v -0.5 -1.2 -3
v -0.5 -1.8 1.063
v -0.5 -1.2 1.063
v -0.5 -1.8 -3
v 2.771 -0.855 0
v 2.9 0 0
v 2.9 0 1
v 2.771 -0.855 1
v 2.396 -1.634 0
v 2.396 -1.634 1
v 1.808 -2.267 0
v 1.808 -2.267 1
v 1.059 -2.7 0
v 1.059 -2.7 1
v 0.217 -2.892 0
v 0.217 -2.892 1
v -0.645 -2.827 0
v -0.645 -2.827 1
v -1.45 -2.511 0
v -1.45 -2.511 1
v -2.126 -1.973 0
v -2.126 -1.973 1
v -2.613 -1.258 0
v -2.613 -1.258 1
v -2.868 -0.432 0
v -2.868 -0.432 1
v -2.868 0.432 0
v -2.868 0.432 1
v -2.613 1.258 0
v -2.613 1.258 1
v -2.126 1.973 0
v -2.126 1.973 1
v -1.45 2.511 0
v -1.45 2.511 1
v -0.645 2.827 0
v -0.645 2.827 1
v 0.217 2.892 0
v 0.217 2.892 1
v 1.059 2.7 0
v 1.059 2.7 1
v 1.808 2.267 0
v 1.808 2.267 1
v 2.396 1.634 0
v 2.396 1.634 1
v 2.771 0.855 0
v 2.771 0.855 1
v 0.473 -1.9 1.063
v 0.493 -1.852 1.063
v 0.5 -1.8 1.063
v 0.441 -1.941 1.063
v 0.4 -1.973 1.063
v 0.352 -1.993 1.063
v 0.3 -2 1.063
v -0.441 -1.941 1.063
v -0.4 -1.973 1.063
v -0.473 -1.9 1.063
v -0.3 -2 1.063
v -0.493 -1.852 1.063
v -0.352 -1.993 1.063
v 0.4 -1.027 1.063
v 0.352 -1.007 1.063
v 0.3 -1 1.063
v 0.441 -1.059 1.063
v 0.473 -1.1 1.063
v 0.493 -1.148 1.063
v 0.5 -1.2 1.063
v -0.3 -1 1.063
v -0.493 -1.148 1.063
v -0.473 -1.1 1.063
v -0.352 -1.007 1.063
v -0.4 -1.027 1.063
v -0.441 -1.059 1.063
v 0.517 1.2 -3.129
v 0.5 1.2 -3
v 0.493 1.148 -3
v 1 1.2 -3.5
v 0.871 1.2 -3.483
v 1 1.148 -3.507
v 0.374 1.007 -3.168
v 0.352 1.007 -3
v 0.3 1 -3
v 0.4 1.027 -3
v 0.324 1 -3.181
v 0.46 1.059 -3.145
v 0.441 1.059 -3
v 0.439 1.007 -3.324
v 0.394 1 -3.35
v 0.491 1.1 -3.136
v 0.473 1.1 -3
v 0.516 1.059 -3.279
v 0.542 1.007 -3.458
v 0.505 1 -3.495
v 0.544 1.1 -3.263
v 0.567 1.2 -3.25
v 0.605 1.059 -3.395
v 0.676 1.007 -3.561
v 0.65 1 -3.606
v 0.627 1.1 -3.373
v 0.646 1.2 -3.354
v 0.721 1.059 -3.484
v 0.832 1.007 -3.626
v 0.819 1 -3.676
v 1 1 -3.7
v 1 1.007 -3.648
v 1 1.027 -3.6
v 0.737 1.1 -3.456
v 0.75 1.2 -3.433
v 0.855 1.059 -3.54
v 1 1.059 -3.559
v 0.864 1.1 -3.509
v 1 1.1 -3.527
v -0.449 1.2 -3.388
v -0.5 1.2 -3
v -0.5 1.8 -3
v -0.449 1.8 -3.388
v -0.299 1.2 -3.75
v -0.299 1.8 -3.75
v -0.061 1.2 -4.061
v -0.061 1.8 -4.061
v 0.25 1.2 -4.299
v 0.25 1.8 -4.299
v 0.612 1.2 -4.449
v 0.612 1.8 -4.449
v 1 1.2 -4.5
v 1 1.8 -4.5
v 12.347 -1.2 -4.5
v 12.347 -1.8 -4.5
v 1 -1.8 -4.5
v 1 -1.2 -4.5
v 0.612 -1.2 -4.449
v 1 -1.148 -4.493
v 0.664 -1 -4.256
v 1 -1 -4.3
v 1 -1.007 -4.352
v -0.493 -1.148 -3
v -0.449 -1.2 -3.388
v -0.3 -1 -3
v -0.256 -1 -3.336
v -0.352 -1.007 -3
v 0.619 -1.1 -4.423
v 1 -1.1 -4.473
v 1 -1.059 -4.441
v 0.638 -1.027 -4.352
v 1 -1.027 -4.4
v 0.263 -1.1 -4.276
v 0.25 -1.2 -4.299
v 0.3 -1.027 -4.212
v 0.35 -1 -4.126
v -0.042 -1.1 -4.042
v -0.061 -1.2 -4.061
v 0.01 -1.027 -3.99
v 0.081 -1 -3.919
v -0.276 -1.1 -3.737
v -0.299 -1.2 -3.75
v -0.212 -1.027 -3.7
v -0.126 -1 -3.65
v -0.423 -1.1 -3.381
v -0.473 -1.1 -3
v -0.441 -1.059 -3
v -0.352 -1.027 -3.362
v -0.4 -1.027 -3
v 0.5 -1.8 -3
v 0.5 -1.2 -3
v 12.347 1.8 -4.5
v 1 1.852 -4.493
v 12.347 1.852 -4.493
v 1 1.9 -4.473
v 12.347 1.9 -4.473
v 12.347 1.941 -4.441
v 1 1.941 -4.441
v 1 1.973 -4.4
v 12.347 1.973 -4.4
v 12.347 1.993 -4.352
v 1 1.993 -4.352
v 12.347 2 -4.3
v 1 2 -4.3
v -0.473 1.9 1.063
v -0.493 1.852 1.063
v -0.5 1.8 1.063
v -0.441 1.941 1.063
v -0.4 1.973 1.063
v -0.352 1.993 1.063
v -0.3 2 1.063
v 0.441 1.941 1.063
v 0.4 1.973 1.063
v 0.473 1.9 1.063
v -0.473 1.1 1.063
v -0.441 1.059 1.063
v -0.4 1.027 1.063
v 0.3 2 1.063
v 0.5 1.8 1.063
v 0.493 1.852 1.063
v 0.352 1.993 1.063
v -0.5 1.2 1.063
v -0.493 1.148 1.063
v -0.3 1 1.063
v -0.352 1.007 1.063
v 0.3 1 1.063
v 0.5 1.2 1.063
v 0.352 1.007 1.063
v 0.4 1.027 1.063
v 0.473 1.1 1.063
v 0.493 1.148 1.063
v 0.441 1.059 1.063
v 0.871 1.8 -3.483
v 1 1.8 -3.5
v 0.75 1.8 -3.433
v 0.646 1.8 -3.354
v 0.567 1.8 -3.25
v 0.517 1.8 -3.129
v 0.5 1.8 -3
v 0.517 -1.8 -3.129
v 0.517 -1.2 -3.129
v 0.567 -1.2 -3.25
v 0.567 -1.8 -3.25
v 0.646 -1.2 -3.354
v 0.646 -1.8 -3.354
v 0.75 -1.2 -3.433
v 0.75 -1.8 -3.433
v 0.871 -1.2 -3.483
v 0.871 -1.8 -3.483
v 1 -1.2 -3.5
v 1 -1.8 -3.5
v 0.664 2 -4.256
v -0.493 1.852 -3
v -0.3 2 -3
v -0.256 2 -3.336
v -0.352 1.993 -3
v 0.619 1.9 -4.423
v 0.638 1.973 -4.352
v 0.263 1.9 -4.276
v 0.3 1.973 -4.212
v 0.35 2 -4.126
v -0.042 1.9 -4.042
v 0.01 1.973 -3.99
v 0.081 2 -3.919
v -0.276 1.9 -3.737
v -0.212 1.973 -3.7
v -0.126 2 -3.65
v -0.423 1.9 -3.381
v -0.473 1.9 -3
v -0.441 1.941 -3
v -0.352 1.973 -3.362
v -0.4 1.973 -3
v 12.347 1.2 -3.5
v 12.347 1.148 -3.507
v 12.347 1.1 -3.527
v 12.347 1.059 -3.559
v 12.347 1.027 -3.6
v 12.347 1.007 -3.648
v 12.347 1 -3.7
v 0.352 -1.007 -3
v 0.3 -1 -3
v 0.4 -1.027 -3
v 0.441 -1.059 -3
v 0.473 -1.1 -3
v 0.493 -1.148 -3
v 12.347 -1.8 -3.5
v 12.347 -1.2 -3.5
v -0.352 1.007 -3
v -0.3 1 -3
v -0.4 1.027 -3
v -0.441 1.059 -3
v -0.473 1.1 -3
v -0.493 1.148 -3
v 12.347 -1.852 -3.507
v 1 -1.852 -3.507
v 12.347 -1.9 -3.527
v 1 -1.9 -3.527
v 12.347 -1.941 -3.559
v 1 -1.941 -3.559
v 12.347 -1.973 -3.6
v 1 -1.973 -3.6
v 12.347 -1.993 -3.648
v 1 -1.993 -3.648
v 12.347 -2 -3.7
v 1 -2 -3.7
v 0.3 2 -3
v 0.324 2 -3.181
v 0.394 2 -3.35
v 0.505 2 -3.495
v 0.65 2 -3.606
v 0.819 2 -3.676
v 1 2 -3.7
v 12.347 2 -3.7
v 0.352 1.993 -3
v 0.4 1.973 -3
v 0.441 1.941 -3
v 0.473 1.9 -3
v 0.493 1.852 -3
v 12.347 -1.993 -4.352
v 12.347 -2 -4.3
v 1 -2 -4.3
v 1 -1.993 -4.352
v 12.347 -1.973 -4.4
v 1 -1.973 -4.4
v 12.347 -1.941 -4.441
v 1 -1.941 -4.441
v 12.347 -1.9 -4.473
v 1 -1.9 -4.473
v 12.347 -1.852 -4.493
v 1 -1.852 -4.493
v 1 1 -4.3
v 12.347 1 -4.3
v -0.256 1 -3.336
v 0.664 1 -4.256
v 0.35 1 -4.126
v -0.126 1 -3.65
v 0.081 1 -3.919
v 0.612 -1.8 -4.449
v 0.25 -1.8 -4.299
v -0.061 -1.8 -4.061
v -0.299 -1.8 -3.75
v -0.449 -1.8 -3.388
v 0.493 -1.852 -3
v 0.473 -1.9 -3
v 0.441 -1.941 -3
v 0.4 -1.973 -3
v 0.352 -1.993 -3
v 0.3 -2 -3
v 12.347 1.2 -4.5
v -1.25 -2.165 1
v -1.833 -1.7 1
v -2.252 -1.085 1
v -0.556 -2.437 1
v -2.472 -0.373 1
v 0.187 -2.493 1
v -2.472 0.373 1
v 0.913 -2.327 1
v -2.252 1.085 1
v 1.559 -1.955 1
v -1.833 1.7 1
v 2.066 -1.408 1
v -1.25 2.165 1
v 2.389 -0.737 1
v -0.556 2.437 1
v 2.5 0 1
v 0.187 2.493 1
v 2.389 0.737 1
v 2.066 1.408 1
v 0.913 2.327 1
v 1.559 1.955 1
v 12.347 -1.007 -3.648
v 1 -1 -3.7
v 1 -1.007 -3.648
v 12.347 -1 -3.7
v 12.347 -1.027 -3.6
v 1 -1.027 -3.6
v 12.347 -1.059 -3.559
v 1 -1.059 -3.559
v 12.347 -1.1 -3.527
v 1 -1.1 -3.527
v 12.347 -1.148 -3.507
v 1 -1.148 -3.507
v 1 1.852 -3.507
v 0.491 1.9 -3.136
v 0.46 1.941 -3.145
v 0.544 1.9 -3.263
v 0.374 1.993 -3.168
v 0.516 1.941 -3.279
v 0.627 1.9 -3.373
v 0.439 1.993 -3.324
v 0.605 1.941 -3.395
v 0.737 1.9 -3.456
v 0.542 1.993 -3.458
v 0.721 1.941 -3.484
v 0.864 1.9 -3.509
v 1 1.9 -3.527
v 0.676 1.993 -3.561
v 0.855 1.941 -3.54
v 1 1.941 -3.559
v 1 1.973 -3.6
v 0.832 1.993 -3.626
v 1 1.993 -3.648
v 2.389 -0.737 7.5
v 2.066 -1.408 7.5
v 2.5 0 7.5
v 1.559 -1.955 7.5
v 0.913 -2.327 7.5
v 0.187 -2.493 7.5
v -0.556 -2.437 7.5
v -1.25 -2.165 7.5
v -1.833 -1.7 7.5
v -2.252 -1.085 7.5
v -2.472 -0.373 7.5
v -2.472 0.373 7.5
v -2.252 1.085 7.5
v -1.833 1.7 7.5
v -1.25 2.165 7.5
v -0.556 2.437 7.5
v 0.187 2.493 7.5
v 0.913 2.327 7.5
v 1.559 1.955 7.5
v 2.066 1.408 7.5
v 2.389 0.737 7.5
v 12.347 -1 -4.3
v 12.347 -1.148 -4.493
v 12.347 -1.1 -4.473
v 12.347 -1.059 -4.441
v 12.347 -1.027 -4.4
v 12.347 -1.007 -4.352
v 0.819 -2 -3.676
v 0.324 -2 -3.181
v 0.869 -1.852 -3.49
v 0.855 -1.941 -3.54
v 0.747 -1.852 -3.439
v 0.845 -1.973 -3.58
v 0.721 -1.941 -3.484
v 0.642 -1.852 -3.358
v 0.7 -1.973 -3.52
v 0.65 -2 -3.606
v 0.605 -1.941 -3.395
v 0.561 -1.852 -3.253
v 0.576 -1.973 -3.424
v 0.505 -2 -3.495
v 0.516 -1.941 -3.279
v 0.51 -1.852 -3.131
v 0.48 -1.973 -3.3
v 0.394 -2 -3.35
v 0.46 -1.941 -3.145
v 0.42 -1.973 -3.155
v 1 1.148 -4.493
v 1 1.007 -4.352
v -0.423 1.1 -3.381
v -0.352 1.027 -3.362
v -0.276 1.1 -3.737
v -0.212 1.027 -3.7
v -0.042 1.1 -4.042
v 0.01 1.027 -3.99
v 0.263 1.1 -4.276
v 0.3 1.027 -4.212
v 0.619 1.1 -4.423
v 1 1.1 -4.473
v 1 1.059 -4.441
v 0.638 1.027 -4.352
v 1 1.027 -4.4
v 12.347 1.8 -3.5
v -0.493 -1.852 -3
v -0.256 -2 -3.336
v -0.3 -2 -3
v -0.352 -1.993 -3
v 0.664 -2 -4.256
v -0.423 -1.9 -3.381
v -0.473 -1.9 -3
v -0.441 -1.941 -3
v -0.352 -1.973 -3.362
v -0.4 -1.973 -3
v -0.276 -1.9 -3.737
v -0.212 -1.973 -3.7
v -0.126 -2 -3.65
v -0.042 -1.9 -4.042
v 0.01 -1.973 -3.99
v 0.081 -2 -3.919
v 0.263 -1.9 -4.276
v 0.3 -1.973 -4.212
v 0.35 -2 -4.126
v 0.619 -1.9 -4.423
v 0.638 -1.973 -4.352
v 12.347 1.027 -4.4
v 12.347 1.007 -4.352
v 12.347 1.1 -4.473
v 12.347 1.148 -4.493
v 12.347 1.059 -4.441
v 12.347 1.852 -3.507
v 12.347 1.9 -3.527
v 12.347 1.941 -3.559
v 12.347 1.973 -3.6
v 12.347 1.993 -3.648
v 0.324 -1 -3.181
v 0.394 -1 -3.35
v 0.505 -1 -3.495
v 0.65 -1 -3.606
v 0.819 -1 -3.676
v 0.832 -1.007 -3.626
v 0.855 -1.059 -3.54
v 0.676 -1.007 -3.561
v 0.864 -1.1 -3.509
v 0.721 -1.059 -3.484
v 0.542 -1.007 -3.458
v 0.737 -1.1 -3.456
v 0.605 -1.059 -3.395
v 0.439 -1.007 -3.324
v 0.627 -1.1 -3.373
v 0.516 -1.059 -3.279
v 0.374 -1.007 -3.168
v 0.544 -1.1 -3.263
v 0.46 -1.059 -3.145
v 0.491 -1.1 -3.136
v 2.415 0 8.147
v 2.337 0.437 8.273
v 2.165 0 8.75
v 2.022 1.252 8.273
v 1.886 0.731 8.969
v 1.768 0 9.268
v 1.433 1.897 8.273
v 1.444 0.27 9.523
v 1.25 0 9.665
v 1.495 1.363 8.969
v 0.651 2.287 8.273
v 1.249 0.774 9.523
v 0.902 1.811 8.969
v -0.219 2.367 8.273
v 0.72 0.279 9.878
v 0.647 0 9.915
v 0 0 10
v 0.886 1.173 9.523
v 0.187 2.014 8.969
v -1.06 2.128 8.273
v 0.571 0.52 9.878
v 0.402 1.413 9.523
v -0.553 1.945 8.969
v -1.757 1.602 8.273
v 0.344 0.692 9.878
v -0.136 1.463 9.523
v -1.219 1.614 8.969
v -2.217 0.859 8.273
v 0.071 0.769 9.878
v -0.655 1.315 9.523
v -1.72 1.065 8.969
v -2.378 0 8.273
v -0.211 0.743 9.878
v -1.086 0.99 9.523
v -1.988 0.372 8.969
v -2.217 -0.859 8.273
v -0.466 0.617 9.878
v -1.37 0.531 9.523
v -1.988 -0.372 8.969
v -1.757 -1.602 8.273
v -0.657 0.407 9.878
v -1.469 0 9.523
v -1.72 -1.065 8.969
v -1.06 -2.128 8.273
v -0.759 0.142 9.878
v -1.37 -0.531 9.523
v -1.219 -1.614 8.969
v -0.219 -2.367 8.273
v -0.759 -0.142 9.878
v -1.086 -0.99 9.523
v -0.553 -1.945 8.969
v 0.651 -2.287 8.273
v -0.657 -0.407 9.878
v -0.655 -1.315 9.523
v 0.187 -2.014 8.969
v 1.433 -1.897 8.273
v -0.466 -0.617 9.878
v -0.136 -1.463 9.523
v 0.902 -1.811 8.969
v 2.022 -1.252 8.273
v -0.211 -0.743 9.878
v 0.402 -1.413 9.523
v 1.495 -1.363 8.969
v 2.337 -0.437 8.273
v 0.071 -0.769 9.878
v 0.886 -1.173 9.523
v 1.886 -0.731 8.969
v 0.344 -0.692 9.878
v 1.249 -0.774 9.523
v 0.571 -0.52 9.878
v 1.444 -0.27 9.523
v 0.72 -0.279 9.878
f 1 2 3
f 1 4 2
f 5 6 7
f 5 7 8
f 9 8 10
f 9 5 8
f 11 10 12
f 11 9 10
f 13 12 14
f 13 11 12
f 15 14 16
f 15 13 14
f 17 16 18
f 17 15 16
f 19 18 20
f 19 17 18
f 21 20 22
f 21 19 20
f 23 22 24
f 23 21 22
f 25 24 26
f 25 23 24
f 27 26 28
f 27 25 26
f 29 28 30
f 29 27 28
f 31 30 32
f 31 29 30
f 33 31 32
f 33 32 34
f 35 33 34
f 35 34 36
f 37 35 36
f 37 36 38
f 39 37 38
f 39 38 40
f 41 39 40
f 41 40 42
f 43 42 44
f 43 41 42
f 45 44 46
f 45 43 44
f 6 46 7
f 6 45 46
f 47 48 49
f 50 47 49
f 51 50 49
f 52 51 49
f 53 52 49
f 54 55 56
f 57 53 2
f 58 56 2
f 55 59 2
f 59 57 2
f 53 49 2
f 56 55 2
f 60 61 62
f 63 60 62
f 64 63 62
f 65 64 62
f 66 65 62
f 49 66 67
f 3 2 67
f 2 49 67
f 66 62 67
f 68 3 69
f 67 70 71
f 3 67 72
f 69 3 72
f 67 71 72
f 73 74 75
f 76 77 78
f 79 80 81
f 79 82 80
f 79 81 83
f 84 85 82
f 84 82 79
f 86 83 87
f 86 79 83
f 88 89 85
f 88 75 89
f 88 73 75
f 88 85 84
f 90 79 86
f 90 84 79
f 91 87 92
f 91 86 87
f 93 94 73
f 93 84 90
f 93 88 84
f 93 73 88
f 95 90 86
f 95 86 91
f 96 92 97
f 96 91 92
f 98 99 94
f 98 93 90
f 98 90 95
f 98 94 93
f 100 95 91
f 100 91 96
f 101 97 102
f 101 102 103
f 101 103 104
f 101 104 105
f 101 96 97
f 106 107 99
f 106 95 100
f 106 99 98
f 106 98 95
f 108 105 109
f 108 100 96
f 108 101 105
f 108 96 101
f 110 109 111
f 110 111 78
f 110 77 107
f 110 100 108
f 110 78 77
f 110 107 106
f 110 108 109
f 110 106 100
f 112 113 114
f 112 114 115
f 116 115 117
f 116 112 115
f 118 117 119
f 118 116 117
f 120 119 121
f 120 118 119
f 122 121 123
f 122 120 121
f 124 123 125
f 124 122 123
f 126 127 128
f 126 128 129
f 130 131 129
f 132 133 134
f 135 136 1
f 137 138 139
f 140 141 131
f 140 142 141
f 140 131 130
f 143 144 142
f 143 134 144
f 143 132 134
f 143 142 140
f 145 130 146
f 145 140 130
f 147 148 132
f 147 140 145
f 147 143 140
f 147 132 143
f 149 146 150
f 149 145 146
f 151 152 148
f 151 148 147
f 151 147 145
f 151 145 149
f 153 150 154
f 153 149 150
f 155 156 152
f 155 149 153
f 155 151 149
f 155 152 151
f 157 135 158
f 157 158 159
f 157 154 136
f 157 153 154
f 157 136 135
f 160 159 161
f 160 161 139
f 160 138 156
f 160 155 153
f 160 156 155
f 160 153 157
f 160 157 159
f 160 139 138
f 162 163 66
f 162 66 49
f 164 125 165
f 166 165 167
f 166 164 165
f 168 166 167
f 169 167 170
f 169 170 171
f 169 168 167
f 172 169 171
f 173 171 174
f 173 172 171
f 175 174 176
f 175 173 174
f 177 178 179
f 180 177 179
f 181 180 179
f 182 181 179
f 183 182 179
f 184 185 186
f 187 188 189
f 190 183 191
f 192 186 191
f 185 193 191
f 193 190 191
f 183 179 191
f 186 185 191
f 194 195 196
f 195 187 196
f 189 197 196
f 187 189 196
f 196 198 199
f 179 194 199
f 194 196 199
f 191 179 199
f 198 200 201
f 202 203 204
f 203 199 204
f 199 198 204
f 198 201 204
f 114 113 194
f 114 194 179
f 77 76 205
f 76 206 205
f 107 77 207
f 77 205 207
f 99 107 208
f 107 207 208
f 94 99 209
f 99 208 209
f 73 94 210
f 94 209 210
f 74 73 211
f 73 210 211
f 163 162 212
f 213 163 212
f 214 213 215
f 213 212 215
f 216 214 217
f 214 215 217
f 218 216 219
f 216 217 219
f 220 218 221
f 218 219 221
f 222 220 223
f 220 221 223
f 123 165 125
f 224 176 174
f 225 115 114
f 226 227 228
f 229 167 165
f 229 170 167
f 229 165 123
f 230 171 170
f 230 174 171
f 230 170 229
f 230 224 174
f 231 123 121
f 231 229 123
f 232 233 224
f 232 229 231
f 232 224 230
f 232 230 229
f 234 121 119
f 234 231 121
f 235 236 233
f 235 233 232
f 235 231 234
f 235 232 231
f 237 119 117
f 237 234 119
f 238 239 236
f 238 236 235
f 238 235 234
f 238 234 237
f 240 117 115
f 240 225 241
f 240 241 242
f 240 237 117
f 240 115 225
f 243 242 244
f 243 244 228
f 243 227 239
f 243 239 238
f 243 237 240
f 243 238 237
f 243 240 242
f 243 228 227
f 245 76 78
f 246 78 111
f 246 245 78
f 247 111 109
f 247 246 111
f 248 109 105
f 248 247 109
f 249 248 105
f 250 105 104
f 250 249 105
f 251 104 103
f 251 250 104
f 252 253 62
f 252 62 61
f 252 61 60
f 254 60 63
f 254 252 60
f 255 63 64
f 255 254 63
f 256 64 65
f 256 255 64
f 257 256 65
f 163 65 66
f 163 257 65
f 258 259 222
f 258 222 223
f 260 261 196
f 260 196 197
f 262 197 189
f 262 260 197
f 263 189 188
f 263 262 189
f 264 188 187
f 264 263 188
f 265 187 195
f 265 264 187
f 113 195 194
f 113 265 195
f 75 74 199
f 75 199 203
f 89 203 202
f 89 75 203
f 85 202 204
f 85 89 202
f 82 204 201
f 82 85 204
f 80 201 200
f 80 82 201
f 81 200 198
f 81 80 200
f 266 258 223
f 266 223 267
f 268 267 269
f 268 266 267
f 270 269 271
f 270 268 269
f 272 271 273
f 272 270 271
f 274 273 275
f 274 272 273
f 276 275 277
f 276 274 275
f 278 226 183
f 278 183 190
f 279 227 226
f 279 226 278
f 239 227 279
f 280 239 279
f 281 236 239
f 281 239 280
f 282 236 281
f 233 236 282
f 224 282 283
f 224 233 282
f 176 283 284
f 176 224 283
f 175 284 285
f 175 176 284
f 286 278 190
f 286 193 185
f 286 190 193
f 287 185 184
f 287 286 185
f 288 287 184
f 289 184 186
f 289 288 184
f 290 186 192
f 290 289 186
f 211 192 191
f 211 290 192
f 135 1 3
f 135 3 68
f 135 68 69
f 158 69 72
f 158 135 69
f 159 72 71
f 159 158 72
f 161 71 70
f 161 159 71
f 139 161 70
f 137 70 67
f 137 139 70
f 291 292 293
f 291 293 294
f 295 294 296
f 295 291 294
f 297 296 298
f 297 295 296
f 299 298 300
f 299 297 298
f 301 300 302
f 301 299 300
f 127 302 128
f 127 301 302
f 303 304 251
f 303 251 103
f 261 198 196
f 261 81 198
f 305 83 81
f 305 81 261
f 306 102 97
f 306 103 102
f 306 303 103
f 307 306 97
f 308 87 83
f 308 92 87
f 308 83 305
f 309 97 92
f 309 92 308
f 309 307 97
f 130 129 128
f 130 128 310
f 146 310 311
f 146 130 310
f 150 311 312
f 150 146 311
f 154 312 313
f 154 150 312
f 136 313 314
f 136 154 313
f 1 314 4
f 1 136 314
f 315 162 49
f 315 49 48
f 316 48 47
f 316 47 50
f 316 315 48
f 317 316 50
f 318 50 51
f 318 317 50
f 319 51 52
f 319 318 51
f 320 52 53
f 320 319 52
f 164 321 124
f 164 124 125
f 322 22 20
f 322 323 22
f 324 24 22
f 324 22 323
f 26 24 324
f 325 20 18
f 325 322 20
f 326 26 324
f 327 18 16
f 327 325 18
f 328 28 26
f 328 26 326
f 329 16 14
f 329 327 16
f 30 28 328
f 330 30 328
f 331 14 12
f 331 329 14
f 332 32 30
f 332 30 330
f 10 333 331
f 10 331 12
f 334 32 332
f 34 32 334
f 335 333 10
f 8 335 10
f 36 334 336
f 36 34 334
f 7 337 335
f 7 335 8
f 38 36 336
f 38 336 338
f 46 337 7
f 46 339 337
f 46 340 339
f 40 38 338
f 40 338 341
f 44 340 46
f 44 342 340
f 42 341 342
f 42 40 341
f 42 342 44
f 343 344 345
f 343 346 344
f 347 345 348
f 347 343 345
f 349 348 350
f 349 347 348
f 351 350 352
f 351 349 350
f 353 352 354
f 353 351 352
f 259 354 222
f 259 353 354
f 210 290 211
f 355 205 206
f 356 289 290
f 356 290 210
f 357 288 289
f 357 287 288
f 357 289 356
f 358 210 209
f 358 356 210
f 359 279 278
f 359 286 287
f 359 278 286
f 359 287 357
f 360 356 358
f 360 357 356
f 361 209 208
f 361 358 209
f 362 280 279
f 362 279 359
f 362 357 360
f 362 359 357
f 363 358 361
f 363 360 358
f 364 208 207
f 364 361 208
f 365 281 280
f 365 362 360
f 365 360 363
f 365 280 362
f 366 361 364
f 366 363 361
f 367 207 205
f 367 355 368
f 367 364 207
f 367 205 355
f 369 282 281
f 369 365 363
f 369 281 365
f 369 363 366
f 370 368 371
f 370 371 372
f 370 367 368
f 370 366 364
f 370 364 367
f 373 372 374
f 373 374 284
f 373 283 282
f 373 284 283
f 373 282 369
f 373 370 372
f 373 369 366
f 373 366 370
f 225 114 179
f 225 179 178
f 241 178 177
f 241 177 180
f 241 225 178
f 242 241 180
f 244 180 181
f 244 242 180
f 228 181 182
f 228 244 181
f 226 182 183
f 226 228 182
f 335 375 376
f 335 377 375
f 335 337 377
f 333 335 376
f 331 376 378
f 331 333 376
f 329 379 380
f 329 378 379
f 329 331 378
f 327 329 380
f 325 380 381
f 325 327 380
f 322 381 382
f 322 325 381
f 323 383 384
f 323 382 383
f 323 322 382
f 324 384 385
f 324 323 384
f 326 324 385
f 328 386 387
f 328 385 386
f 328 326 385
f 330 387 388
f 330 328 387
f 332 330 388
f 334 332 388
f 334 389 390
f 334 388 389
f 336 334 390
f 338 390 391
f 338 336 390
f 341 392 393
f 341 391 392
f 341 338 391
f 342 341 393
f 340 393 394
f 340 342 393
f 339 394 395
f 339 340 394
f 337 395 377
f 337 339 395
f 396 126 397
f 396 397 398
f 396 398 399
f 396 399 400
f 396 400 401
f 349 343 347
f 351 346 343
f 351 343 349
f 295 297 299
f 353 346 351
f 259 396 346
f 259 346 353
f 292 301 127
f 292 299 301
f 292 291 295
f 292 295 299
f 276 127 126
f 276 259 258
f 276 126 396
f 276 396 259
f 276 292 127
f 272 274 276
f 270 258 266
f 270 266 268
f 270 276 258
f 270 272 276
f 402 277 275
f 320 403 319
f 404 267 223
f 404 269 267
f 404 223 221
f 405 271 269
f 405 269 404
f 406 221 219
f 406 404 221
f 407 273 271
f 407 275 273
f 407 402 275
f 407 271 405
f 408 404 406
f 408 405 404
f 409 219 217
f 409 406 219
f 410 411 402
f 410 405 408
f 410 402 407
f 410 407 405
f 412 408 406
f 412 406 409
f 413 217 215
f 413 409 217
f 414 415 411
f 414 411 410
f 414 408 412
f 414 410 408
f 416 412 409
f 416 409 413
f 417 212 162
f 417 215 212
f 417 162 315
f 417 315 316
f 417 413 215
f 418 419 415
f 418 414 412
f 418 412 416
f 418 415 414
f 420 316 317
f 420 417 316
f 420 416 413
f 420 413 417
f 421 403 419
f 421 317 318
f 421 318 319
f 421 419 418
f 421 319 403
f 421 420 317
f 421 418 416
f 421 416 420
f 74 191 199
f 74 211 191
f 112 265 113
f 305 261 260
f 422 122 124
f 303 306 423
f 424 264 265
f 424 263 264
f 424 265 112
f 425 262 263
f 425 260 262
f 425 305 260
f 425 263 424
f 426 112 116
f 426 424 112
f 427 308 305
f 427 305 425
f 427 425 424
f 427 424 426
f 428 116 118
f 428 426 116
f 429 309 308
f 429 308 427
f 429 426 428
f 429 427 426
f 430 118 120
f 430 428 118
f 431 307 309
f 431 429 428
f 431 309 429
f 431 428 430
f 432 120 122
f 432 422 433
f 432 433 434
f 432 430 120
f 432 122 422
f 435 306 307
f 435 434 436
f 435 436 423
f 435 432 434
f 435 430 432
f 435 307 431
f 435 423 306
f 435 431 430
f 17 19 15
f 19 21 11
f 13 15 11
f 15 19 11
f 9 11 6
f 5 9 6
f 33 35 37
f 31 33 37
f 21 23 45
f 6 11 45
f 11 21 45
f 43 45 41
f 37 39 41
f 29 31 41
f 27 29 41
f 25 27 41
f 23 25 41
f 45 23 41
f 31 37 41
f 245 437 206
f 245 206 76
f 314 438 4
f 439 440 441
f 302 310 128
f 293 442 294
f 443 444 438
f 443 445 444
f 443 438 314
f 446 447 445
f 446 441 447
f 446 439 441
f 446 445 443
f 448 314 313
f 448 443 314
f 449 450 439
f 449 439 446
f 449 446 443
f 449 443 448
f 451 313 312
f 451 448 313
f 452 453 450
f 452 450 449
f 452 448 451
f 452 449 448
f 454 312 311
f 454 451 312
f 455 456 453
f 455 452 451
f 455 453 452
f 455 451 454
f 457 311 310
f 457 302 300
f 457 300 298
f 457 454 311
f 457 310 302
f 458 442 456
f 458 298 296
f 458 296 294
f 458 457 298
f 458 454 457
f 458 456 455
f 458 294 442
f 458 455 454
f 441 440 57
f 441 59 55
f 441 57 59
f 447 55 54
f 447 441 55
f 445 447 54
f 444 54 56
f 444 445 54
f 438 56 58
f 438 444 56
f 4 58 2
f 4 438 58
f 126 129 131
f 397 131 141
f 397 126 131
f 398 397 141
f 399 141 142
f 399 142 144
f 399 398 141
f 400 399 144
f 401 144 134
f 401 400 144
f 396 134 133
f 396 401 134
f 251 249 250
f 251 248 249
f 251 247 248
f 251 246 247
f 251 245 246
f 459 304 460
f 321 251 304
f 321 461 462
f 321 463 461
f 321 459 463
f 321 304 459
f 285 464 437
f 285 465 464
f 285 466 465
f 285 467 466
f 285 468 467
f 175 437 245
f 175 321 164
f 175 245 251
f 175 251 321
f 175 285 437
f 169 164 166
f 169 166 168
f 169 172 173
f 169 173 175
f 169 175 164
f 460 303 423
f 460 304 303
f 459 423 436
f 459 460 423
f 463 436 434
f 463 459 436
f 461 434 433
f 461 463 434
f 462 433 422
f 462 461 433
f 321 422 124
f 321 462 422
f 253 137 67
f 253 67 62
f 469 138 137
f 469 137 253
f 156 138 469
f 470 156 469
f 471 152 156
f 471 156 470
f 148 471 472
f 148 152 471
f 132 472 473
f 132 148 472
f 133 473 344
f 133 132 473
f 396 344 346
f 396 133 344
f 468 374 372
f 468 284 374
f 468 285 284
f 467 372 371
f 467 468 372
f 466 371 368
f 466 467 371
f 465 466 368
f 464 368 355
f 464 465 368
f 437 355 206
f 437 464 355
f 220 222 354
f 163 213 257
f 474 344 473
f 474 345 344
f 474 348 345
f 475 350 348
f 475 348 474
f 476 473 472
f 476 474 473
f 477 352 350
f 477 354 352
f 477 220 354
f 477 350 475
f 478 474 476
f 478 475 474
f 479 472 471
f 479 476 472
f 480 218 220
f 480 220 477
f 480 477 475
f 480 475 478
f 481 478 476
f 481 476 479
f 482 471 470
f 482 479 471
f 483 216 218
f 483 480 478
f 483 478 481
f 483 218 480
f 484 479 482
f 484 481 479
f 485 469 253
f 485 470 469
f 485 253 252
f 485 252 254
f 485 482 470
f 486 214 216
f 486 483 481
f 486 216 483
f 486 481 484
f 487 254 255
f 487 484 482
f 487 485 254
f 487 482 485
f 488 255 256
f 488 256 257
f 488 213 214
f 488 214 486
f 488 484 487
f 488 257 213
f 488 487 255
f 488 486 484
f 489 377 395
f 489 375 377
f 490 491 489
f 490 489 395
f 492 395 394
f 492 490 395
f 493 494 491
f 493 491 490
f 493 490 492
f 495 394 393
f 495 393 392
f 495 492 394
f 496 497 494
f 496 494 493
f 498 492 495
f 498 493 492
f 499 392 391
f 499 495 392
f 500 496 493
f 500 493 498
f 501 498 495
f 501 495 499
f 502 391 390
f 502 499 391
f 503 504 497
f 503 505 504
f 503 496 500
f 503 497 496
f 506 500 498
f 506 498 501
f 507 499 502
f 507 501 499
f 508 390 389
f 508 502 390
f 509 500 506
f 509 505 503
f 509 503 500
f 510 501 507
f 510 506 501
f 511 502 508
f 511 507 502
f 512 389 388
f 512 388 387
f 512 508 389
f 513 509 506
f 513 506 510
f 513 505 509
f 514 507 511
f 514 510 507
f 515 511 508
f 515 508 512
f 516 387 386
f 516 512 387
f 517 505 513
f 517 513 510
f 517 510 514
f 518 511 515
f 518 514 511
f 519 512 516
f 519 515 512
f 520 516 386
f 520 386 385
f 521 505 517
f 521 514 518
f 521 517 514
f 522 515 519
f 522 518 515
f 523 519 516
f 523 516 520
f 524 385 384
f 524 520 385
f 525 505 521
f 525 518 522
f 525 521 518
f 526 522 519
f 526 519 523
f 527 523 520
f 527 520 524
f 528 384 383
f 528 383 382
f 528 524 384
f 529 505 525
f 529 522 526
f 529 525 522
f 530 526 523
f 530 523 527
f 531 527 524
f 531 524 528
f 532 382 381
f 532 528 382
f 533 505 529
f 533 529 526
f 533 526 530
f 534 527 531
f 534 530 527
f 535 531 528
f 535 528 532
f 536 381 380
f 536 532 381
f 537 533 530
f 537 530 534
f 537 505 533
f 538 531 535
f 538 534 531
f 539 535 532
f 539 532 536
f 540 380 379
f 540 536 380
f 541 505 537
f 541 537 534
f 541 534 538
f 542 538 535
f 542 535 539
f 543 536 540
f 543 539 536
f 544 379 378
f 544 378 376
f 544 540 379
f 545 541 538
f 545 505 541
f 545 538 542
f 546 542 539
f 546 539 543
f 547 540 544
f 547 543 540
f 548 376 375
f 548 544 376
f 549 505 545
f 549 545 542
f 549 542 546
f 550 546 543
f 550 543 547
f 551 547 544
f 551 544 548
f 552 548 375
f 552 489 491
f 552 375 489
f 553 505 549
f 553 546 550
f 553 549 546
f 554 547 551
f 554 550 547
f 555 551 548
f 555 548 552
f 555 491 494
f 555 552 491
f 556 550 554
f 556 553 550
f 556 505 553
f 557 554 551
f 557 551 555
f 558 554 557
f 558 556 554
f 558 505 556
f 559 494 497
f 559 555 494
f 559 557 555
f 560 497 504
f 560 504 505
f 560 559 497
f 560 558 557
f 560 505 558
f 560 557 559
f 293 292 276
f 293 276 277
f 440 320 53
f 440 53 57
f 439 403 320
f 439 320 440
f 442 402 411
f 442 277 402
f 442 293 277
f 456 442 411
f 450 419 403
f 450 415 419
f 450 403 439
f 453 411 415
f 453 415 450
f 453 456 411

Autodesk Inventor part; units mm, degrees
ref_plane "YZ Plane" through (0, 0, 0) normal (1, 0, 0) x (0, 1, 0)
sketch "Skizze1" plane through (0, 0, 0) normal (0, 0, 1) x (1, 0, 0)
  circle A0 centre (0, 0) radius 2.9
  dimension "d0" = 5.8
extrude "Extrusion1" add sketch "Skizze1" along normal blind 1
sketch "Skizze2" plane through (0, 0, 1) normal (0, 0, 1) x (1, 0, 0)
  circle A0 centre (0, 0) radius 2.5
  dimension "d3" = 5
extrude "Extrusion2" add sketch "Skizze2" along normal blind 9
fillet "Rundung1" radius 2.5 1 edges at (-2.5, 0, 10)
sketch "Skizze3" plane through (0, 0, 0) normal (0, 0, -1) x (-1, 0, 0)
  point P0 (0, 0)
ref_plane "Arbeitsebene1" through (0, -1.5, 0) normal (0, 1, 0) x (-1, 0, 0)
sketch "Skizze4" plane through (0, -1.5, 0) normal (0, 1, 0) x (-1, 0, 0)
  line L0 (0, 1.0632) -> (0, -3)
  line L1 (-1, -4) -> (-12.3472, -4)
  arc A0 (-1, -4) -> (0, -3) centre (-1, -3) ccw
  line L2 (2.9, 0) -> (-2.9, 0) projected
  point P0 (0, 0)
  dimension "d8" = 1
  dimension "d9" = 4
ref_plane "Arbeitsebene2" through (12.3472, -1.5, -4) normal (1, 0, 0) x (0, 1, 0)
sketch "Skizze5" plane through (12.3472, -1.5, -4) normal (1, 0, 0) x (0, 1, 0)
  line L0 (0.5, -0.5) -> (-0.5, -0.5)
  line L1 (-0.5, -0.5) -> (-0.5, 0.5)
  line L2 (-0.5, 0.5) -> (0.5, 0.5)
  line L3 (0.5, 0.5) -> (0.5, -0.5)
  line L4 (0.5, -0.5) -> (-0.5, 0.5) construction
  line L5 (-0.5, -0.5) -> (0.5, 0.5) construction
  point P0 (1.5, 4)
  point P1 (0, 0)
  dimension "d10" = 1
sweep "Sweeping1" add profiles "Skizze5" path "Skizze4" separate body path curves L1 A0 L0
fillet "Rundung2" radius 0.2 12 edges at (-0.5, -2, -0.9684) (-0.0607, -2, -4.0607) (6.6736, -2, -4.5) (0.5, -2, -0.9684) (0.6464, -2, -3.3536) (6.6736, -2, -3.5) (-0.5, -1, -0.9684) (-0.0607, -1, -4.0607) (6.6736, -1, -4.5) (0.5, -1, -0.9684) (0.6464, -1, -3.3536) (6.6736, -1, -3.5)
mirror "Spiegeln1" about plane through (0, 0, 0) normal (0, 1, 0) bodies 2
properties part number "P_LED_5"
